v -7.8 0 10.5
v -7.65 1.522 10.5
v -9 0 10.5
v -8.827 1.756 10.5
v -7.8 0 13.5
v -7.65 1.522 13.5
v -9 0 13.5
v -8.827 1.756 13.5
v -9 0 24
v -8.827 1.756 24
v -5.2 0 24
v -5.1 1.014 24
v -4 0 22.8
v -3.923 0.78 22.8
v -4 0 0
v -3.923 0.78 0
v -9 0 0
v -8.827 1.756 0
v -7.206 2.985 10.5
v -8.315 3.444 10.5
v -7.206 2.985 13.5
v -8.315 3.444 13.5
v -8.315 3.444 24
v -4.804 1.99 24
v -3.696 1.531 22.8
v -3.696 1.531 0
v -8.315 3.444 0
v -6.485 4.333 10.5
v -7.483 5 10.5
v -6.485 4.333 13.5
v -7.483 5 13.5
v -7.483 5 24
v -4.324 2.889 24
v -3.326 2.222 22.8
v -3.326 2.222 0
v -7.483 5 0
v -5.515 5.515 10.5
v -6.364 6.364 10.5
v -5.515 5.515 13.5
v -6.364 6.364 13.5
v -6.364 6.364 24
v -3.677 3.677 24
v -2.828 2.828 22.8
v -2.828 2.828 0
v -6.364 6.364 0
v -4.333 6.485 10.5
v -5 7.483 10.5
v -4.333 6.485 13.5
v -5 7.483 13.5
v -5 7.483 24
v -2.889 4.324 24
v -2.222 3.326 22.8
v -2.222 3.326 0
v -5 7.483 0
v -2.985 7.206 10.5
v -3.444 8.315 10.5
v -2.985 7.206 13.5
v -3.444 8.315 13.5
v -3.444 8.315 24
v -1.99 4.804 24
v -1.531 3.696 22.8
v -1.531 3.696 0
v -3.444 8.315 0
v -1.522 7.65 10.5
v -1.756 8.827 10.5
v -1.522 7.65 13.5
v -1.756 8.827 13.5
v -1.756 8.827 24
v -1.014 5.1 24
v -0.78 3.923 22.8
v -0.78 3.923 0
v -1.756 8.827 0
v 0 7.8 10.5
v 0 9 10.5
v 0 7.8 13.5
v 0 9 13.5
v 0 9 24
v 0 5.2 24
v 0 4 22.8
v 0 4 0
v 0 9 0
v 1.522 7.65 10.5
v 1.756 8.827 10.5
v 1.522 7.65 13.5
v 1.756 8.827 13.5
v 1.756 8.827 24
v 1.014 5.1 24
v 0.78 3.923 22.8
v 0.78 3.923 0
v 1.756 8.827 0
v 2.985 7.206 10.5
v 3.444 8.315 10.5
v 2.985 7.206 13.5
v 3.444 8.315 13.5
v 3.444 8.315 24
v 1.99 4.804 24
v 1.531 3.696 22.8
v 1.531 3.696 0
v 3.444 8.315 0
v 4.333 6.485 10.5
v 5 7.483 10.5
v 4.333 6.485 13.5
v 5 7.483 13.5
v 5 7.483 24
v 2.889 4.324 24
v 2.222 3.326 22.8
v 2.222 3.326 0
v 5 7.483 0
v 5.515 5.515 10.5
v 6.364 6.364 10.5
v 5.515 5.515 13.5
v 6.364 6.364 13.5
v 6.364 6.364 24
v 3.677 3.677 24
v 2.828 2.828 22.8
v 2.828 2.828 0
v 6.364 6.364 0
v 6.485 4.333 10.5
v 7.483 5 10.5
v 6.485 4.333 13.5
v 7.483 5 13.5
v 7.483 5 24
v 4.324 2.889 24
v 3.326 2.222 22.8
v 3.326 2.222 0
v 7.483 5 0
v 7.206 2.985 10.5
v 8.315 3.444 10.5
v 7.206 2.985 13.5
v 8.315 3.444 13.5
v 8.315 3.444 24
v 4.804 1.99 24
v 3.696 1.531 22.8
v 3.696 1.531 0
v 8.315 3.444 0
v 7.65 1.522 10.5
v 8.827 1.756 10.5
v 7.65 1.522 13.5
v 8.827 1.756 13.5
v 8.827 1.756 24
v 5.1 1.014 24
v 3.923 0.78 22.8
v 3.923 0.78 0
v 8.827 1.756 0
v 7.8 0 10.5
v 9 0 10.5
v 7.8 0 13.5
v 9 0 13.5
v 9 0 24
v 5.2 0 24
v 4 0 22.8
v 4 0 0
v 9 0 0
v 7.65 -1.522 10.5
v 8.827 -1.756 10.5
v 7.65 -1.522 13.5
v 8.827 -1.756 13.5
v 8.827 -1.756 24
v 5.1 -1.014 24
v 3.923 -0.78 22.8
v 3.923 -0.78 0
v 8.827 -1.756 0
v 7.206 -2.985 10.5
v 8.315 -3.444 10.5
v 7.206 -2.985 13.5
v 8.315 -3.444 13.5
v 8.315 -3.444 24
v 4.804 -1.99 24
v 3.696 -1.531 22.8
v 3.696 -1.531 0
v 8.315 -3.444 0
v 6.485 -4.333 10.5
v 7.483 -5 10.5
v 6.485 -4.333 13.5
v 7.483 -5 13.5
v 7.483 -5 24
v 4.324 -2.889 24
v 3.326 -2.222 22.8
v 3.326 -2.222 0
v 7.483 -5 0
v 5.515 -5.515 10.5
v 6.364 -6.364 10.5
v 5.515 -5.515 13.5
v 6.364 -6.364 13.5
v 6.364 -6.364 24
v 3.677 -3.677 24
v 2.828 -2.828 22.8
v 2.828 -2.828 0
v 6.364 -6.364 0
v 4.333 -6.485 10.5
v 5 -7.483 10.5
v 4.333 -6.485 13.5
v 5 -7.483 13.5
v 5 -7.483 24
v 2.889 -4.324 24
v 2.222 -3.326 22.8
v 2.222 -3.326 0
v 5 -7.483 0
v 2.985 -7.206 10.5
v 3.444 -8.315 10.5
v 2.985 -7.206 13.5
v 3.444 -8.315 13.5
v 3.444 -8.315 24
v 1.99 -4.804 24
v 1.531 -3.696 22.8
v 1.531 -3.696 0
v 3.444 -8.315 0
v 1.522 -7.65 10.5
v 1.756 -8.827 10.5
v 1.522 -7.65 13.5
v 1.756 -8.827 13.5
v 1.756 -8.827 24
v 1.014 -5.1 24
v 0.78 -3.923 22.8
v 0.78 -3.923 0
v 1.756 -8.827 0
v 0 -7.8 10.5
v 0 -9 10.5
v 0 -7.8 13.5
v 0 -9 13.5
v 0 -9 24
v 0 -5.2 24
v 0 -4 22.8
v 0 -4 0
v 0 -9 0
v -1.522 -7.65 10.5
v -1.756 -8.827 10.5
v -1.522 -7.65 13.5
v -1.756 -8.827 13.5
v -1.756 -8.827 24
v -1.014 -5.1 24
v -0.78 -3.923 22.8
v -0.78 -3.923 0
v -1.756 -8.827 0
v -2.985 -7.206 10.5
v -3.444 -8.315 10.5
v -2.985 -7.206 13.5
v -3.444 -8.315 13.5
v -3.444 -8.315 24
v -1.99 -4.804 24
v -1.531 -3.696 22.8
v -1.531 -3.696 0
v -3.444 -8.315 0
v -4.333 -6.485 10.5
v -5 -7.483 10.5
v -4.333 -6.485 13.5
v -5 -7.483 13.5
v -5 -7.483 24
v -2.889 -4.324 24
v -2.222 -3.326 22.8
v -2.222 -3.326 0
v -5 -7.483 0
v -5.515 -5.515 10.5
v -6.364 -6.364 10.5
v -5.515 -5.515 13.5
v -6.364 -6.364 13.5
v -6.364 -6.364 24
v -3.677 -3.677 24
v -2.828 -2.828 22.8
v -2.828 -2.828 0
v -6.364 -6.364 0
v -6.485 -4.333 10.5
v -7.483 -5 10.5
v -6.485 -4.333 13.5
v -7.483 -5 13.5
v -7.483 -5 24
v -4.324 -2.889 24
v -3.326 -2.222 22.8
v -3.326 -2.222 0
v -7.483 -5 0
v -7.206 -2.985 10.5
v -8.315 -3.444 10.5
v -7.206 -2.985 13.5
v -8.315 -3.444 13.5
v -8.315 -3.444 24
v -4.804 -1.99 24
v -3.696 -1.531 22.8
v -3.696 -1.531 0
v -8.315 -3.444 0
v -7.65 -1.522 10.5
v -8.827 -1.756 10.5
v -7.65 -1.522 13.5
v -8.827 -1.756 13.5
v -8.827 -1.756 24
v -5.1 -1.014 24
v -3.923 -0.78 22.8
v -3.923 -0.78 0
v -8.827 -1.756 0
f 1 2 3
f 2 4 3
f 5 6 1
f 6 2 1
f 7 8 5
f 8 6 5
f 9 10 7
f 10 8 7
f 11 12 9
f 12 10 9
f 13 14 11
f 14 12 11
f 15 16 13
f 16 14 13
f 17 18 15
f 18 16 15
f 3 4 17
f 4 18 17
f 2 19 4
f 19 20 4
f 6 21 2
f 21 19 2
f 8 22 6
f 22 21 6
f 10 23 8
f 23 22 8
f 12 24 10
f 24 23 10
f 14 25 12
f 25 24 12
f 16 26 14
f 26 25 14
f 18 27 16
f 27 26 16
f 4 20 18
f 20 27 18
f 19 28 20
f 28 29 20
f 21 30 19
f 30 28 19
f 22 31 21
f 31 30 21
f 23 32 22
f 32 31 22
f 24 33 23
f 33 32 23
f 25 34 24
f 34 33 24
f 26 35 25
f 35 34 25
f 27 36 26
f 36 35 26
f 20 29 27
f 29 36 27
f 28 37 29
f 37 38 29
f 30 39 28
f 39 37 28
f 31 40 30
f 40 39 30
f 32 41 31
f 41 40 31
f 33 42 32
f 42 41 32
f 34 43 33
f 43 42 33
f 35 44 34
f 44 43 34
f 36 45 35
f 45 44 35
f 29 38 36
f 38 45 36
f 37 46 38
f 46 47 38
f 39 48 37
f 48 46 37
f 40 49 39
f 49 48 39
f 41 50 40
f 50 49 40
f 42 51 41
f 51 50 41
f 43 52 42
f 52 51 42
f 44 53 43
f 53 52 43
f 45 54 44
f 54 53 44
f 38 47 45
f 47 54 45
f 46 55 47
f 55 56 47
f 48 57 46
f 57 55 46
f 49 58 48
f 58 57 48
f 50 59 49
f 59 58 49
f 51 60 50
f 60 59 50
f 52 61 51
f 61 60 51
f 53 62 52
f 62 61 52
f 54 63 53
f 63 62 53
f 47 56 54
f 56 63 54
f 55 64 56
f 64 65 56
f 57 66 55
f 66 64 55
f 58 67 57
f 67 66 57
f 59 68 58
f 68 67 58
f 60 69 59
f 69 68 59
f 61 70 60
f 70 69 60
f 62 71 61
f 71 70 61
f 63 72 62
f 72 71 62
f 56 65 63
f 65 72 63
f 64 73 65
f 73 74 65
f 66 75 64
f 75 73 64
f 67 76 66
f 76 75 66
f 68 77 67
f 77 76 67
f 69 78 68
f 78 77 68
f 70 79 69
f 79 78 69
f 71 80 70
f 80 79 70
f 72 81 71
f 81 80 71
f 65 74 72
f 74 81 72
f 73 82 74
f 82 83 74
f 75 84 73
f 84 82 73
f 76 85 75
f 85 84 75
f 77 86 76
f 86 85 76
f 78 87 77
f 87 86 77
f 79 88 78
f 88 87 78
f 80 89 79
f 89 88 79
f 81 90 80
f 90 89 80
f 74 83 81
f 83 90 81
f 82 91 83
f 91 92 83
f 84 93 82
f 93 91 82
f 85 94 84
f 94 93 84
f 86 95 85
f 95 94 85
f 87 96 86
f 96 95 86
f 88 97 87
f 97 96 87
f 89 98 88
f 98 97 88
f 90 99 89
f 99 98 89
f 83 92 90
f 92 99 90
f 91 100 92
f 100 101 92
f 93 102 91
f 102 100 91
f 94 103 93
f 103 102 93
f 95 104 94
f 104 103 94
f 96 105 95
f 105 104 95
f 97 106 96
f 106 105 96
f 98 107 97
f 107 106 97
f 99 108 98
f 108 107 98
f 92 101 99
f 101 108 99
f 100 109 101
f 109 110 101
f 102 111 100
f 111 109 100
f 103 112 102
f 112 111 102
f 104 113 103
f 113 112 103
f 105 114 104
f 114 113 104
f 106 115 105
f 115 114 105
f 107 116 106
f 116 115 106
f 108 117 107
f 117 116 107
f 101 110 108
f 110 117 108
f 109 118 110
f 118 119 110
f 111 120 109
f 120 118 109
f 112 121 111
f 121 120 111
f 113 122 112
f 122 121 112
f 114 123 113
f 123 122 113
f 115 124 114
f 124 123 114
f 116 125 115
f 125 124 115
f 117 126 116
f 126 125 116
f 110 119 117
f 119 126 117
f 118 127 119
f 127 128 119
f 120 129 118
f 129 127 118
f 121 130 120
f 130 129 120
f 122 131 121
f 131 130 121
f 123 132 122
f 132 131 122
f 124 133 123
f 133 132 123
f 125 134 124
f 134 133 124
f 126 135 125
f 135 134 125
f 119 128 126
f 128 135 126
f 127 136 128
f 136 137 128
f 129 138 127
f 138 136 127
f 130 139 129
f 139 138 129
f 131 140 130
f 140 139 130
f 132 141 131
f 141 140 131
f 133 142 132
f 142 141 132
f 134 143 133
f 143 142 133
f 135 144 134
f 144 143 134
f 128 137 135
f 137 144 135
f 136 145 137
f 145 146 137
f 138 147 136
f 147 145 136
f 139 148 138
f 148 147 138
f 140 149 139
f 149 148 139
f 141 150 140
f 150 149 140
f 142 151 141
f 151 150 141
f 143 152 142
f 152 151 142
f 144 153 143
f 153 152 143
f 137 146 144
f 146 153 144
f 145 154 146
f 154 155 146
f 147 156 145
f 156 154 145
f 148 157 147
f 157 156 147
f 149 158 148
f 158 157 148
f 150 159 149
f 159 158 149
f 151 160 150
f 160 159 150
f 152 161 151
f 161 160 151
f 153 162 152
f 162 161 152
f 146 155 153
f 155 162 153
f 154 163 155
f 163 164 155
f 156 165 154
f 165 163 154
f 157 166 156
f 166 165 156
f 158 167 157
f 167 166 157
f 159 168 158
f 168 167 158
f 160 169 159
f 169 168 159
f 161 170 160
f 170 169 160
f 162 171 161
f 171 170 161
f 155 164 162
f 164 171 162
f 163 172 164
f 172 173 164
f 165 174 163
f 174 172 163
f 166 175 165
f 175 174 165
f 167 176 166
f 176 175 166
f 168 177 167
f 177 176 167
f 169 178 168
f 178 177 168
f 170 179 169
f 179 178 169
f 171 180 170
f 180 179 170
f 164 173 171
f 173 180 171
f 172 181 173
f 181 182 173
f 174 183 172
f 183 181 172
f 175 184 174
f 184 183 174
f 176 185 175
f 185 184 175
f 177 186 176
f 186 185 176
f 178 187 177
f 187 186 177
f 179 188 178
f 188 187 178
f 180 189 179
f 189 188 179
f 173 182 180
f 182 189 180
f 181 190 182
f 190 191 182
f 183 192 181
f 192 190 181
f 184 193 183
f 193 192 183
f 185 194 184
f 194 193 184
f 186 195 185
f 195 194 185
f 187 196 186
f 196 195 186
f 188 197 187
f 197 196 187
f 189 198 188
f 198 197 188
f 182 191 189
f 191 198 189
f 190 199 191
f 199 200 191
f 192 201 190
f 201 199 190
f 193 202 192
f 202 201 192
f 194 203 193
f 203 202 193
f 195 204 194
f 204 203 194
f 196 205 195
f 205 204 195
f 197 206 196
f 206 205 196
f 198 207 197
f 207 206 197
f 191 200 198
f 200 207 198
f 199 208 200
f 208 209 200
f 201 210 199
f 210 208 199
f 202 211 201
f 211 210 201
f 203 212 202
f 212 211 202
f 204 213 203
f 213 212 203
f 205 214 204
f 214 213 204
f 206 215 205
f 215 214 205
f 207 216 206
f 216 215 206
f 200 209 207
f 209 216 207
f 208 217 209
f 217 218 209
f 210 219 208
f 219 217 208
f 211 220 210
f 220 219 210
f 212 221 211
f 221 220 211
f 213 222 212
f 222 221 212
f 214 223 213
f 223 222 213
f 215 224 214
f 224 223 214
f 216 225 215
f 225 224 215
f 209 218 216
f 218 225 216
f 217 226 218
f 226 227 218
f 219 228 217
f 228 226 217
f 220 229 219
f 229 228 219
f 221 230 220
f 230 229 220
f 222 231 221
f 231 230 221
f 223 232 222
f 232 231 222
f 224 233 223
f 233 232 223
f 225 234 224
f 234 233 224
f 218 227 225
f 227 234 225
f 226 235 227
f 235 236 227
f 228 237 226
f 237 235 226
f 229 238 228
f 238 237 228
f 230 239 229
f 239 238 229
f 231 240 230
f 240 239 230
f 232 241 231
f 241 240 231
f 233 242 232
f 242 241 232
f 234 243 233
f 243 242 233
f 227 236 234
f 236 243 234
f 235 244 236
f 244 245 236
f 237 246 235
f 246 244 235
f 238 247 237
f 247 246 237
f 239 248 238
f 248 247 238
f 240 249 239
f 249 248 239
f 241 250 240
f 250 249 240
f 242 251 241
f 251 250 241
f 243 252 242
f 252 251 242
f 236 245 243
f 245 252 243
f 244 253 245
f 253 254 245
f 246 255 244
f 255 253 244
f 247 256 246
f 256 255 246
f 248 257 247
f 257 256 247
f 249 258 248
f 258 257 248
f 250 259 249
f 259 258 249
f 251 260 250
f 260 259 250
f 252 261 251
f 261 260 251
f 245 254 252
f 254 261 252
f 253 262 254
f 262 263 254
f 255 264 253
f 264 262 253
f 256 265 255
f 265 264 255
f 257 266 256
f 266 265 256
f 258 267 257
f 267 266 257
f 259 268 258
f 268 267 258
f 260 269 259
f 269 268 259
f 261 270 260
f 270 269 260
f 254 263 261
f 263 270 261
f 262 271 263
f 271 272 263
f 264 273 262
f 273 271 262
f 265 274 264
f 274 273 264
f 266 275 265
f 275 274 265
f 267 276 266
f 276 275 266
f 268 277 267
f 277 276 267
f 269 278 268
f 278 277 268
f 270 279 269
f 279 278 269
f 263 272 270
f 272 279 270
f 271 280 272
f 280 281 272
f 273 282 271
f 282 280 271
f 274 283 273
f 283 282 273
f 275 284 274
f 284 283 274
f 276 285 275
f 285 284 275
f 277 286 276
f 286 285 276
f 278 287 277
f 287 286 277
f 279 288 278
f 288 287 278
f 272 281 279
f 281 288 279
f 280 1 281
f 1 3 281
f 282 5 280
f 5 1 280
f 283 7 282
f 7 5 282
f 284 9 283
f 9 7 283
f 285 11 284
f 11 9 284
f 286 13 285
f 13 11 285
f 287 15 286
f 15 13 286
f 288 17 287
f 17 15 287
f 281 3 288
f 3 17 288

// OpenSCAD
$fn = 32;

// ----------------------------------------------------------------------
// Grooved revolve: thread_relief, bore R4
// ----------------------------------------------------------------------

// --- parameters (mm) ---
bore_r = 4;               // bore radius
outer_r = 9;              // outer radius of the body
total_h = 24;             // overall height, Z
wall = 5;                 // radial wall thickness
groove_w = 3;             // groove width
groove_d = 1.2;           // groove depth
grooves = 1;              // number of outer grooves
relief = 1.2;             // thread relief leg at the bore mouth
relief_angle = 45;        // thread relief chamfer angle, degrees

bbox_x = 2 * outer_r;  // full diameter
bore_d = 2 * bore_r;  // bore diameter
body_d = 2 * outer_r;  // body diameter
revolve_angle = 360;  // full turn around the Z axis

profile = [[4, 0], [9, 0], [9, 10.5], [7.8, 10.5], [7.8, 13.5], [9, 13.5], [9, 24], [5.2, 24], [4, 22.8]];  // primary outline, 9 points, counter clockwise

// --- the one profile operation ---
rotate_extrude(angle = revolve_angle) polygon(points = profile);
